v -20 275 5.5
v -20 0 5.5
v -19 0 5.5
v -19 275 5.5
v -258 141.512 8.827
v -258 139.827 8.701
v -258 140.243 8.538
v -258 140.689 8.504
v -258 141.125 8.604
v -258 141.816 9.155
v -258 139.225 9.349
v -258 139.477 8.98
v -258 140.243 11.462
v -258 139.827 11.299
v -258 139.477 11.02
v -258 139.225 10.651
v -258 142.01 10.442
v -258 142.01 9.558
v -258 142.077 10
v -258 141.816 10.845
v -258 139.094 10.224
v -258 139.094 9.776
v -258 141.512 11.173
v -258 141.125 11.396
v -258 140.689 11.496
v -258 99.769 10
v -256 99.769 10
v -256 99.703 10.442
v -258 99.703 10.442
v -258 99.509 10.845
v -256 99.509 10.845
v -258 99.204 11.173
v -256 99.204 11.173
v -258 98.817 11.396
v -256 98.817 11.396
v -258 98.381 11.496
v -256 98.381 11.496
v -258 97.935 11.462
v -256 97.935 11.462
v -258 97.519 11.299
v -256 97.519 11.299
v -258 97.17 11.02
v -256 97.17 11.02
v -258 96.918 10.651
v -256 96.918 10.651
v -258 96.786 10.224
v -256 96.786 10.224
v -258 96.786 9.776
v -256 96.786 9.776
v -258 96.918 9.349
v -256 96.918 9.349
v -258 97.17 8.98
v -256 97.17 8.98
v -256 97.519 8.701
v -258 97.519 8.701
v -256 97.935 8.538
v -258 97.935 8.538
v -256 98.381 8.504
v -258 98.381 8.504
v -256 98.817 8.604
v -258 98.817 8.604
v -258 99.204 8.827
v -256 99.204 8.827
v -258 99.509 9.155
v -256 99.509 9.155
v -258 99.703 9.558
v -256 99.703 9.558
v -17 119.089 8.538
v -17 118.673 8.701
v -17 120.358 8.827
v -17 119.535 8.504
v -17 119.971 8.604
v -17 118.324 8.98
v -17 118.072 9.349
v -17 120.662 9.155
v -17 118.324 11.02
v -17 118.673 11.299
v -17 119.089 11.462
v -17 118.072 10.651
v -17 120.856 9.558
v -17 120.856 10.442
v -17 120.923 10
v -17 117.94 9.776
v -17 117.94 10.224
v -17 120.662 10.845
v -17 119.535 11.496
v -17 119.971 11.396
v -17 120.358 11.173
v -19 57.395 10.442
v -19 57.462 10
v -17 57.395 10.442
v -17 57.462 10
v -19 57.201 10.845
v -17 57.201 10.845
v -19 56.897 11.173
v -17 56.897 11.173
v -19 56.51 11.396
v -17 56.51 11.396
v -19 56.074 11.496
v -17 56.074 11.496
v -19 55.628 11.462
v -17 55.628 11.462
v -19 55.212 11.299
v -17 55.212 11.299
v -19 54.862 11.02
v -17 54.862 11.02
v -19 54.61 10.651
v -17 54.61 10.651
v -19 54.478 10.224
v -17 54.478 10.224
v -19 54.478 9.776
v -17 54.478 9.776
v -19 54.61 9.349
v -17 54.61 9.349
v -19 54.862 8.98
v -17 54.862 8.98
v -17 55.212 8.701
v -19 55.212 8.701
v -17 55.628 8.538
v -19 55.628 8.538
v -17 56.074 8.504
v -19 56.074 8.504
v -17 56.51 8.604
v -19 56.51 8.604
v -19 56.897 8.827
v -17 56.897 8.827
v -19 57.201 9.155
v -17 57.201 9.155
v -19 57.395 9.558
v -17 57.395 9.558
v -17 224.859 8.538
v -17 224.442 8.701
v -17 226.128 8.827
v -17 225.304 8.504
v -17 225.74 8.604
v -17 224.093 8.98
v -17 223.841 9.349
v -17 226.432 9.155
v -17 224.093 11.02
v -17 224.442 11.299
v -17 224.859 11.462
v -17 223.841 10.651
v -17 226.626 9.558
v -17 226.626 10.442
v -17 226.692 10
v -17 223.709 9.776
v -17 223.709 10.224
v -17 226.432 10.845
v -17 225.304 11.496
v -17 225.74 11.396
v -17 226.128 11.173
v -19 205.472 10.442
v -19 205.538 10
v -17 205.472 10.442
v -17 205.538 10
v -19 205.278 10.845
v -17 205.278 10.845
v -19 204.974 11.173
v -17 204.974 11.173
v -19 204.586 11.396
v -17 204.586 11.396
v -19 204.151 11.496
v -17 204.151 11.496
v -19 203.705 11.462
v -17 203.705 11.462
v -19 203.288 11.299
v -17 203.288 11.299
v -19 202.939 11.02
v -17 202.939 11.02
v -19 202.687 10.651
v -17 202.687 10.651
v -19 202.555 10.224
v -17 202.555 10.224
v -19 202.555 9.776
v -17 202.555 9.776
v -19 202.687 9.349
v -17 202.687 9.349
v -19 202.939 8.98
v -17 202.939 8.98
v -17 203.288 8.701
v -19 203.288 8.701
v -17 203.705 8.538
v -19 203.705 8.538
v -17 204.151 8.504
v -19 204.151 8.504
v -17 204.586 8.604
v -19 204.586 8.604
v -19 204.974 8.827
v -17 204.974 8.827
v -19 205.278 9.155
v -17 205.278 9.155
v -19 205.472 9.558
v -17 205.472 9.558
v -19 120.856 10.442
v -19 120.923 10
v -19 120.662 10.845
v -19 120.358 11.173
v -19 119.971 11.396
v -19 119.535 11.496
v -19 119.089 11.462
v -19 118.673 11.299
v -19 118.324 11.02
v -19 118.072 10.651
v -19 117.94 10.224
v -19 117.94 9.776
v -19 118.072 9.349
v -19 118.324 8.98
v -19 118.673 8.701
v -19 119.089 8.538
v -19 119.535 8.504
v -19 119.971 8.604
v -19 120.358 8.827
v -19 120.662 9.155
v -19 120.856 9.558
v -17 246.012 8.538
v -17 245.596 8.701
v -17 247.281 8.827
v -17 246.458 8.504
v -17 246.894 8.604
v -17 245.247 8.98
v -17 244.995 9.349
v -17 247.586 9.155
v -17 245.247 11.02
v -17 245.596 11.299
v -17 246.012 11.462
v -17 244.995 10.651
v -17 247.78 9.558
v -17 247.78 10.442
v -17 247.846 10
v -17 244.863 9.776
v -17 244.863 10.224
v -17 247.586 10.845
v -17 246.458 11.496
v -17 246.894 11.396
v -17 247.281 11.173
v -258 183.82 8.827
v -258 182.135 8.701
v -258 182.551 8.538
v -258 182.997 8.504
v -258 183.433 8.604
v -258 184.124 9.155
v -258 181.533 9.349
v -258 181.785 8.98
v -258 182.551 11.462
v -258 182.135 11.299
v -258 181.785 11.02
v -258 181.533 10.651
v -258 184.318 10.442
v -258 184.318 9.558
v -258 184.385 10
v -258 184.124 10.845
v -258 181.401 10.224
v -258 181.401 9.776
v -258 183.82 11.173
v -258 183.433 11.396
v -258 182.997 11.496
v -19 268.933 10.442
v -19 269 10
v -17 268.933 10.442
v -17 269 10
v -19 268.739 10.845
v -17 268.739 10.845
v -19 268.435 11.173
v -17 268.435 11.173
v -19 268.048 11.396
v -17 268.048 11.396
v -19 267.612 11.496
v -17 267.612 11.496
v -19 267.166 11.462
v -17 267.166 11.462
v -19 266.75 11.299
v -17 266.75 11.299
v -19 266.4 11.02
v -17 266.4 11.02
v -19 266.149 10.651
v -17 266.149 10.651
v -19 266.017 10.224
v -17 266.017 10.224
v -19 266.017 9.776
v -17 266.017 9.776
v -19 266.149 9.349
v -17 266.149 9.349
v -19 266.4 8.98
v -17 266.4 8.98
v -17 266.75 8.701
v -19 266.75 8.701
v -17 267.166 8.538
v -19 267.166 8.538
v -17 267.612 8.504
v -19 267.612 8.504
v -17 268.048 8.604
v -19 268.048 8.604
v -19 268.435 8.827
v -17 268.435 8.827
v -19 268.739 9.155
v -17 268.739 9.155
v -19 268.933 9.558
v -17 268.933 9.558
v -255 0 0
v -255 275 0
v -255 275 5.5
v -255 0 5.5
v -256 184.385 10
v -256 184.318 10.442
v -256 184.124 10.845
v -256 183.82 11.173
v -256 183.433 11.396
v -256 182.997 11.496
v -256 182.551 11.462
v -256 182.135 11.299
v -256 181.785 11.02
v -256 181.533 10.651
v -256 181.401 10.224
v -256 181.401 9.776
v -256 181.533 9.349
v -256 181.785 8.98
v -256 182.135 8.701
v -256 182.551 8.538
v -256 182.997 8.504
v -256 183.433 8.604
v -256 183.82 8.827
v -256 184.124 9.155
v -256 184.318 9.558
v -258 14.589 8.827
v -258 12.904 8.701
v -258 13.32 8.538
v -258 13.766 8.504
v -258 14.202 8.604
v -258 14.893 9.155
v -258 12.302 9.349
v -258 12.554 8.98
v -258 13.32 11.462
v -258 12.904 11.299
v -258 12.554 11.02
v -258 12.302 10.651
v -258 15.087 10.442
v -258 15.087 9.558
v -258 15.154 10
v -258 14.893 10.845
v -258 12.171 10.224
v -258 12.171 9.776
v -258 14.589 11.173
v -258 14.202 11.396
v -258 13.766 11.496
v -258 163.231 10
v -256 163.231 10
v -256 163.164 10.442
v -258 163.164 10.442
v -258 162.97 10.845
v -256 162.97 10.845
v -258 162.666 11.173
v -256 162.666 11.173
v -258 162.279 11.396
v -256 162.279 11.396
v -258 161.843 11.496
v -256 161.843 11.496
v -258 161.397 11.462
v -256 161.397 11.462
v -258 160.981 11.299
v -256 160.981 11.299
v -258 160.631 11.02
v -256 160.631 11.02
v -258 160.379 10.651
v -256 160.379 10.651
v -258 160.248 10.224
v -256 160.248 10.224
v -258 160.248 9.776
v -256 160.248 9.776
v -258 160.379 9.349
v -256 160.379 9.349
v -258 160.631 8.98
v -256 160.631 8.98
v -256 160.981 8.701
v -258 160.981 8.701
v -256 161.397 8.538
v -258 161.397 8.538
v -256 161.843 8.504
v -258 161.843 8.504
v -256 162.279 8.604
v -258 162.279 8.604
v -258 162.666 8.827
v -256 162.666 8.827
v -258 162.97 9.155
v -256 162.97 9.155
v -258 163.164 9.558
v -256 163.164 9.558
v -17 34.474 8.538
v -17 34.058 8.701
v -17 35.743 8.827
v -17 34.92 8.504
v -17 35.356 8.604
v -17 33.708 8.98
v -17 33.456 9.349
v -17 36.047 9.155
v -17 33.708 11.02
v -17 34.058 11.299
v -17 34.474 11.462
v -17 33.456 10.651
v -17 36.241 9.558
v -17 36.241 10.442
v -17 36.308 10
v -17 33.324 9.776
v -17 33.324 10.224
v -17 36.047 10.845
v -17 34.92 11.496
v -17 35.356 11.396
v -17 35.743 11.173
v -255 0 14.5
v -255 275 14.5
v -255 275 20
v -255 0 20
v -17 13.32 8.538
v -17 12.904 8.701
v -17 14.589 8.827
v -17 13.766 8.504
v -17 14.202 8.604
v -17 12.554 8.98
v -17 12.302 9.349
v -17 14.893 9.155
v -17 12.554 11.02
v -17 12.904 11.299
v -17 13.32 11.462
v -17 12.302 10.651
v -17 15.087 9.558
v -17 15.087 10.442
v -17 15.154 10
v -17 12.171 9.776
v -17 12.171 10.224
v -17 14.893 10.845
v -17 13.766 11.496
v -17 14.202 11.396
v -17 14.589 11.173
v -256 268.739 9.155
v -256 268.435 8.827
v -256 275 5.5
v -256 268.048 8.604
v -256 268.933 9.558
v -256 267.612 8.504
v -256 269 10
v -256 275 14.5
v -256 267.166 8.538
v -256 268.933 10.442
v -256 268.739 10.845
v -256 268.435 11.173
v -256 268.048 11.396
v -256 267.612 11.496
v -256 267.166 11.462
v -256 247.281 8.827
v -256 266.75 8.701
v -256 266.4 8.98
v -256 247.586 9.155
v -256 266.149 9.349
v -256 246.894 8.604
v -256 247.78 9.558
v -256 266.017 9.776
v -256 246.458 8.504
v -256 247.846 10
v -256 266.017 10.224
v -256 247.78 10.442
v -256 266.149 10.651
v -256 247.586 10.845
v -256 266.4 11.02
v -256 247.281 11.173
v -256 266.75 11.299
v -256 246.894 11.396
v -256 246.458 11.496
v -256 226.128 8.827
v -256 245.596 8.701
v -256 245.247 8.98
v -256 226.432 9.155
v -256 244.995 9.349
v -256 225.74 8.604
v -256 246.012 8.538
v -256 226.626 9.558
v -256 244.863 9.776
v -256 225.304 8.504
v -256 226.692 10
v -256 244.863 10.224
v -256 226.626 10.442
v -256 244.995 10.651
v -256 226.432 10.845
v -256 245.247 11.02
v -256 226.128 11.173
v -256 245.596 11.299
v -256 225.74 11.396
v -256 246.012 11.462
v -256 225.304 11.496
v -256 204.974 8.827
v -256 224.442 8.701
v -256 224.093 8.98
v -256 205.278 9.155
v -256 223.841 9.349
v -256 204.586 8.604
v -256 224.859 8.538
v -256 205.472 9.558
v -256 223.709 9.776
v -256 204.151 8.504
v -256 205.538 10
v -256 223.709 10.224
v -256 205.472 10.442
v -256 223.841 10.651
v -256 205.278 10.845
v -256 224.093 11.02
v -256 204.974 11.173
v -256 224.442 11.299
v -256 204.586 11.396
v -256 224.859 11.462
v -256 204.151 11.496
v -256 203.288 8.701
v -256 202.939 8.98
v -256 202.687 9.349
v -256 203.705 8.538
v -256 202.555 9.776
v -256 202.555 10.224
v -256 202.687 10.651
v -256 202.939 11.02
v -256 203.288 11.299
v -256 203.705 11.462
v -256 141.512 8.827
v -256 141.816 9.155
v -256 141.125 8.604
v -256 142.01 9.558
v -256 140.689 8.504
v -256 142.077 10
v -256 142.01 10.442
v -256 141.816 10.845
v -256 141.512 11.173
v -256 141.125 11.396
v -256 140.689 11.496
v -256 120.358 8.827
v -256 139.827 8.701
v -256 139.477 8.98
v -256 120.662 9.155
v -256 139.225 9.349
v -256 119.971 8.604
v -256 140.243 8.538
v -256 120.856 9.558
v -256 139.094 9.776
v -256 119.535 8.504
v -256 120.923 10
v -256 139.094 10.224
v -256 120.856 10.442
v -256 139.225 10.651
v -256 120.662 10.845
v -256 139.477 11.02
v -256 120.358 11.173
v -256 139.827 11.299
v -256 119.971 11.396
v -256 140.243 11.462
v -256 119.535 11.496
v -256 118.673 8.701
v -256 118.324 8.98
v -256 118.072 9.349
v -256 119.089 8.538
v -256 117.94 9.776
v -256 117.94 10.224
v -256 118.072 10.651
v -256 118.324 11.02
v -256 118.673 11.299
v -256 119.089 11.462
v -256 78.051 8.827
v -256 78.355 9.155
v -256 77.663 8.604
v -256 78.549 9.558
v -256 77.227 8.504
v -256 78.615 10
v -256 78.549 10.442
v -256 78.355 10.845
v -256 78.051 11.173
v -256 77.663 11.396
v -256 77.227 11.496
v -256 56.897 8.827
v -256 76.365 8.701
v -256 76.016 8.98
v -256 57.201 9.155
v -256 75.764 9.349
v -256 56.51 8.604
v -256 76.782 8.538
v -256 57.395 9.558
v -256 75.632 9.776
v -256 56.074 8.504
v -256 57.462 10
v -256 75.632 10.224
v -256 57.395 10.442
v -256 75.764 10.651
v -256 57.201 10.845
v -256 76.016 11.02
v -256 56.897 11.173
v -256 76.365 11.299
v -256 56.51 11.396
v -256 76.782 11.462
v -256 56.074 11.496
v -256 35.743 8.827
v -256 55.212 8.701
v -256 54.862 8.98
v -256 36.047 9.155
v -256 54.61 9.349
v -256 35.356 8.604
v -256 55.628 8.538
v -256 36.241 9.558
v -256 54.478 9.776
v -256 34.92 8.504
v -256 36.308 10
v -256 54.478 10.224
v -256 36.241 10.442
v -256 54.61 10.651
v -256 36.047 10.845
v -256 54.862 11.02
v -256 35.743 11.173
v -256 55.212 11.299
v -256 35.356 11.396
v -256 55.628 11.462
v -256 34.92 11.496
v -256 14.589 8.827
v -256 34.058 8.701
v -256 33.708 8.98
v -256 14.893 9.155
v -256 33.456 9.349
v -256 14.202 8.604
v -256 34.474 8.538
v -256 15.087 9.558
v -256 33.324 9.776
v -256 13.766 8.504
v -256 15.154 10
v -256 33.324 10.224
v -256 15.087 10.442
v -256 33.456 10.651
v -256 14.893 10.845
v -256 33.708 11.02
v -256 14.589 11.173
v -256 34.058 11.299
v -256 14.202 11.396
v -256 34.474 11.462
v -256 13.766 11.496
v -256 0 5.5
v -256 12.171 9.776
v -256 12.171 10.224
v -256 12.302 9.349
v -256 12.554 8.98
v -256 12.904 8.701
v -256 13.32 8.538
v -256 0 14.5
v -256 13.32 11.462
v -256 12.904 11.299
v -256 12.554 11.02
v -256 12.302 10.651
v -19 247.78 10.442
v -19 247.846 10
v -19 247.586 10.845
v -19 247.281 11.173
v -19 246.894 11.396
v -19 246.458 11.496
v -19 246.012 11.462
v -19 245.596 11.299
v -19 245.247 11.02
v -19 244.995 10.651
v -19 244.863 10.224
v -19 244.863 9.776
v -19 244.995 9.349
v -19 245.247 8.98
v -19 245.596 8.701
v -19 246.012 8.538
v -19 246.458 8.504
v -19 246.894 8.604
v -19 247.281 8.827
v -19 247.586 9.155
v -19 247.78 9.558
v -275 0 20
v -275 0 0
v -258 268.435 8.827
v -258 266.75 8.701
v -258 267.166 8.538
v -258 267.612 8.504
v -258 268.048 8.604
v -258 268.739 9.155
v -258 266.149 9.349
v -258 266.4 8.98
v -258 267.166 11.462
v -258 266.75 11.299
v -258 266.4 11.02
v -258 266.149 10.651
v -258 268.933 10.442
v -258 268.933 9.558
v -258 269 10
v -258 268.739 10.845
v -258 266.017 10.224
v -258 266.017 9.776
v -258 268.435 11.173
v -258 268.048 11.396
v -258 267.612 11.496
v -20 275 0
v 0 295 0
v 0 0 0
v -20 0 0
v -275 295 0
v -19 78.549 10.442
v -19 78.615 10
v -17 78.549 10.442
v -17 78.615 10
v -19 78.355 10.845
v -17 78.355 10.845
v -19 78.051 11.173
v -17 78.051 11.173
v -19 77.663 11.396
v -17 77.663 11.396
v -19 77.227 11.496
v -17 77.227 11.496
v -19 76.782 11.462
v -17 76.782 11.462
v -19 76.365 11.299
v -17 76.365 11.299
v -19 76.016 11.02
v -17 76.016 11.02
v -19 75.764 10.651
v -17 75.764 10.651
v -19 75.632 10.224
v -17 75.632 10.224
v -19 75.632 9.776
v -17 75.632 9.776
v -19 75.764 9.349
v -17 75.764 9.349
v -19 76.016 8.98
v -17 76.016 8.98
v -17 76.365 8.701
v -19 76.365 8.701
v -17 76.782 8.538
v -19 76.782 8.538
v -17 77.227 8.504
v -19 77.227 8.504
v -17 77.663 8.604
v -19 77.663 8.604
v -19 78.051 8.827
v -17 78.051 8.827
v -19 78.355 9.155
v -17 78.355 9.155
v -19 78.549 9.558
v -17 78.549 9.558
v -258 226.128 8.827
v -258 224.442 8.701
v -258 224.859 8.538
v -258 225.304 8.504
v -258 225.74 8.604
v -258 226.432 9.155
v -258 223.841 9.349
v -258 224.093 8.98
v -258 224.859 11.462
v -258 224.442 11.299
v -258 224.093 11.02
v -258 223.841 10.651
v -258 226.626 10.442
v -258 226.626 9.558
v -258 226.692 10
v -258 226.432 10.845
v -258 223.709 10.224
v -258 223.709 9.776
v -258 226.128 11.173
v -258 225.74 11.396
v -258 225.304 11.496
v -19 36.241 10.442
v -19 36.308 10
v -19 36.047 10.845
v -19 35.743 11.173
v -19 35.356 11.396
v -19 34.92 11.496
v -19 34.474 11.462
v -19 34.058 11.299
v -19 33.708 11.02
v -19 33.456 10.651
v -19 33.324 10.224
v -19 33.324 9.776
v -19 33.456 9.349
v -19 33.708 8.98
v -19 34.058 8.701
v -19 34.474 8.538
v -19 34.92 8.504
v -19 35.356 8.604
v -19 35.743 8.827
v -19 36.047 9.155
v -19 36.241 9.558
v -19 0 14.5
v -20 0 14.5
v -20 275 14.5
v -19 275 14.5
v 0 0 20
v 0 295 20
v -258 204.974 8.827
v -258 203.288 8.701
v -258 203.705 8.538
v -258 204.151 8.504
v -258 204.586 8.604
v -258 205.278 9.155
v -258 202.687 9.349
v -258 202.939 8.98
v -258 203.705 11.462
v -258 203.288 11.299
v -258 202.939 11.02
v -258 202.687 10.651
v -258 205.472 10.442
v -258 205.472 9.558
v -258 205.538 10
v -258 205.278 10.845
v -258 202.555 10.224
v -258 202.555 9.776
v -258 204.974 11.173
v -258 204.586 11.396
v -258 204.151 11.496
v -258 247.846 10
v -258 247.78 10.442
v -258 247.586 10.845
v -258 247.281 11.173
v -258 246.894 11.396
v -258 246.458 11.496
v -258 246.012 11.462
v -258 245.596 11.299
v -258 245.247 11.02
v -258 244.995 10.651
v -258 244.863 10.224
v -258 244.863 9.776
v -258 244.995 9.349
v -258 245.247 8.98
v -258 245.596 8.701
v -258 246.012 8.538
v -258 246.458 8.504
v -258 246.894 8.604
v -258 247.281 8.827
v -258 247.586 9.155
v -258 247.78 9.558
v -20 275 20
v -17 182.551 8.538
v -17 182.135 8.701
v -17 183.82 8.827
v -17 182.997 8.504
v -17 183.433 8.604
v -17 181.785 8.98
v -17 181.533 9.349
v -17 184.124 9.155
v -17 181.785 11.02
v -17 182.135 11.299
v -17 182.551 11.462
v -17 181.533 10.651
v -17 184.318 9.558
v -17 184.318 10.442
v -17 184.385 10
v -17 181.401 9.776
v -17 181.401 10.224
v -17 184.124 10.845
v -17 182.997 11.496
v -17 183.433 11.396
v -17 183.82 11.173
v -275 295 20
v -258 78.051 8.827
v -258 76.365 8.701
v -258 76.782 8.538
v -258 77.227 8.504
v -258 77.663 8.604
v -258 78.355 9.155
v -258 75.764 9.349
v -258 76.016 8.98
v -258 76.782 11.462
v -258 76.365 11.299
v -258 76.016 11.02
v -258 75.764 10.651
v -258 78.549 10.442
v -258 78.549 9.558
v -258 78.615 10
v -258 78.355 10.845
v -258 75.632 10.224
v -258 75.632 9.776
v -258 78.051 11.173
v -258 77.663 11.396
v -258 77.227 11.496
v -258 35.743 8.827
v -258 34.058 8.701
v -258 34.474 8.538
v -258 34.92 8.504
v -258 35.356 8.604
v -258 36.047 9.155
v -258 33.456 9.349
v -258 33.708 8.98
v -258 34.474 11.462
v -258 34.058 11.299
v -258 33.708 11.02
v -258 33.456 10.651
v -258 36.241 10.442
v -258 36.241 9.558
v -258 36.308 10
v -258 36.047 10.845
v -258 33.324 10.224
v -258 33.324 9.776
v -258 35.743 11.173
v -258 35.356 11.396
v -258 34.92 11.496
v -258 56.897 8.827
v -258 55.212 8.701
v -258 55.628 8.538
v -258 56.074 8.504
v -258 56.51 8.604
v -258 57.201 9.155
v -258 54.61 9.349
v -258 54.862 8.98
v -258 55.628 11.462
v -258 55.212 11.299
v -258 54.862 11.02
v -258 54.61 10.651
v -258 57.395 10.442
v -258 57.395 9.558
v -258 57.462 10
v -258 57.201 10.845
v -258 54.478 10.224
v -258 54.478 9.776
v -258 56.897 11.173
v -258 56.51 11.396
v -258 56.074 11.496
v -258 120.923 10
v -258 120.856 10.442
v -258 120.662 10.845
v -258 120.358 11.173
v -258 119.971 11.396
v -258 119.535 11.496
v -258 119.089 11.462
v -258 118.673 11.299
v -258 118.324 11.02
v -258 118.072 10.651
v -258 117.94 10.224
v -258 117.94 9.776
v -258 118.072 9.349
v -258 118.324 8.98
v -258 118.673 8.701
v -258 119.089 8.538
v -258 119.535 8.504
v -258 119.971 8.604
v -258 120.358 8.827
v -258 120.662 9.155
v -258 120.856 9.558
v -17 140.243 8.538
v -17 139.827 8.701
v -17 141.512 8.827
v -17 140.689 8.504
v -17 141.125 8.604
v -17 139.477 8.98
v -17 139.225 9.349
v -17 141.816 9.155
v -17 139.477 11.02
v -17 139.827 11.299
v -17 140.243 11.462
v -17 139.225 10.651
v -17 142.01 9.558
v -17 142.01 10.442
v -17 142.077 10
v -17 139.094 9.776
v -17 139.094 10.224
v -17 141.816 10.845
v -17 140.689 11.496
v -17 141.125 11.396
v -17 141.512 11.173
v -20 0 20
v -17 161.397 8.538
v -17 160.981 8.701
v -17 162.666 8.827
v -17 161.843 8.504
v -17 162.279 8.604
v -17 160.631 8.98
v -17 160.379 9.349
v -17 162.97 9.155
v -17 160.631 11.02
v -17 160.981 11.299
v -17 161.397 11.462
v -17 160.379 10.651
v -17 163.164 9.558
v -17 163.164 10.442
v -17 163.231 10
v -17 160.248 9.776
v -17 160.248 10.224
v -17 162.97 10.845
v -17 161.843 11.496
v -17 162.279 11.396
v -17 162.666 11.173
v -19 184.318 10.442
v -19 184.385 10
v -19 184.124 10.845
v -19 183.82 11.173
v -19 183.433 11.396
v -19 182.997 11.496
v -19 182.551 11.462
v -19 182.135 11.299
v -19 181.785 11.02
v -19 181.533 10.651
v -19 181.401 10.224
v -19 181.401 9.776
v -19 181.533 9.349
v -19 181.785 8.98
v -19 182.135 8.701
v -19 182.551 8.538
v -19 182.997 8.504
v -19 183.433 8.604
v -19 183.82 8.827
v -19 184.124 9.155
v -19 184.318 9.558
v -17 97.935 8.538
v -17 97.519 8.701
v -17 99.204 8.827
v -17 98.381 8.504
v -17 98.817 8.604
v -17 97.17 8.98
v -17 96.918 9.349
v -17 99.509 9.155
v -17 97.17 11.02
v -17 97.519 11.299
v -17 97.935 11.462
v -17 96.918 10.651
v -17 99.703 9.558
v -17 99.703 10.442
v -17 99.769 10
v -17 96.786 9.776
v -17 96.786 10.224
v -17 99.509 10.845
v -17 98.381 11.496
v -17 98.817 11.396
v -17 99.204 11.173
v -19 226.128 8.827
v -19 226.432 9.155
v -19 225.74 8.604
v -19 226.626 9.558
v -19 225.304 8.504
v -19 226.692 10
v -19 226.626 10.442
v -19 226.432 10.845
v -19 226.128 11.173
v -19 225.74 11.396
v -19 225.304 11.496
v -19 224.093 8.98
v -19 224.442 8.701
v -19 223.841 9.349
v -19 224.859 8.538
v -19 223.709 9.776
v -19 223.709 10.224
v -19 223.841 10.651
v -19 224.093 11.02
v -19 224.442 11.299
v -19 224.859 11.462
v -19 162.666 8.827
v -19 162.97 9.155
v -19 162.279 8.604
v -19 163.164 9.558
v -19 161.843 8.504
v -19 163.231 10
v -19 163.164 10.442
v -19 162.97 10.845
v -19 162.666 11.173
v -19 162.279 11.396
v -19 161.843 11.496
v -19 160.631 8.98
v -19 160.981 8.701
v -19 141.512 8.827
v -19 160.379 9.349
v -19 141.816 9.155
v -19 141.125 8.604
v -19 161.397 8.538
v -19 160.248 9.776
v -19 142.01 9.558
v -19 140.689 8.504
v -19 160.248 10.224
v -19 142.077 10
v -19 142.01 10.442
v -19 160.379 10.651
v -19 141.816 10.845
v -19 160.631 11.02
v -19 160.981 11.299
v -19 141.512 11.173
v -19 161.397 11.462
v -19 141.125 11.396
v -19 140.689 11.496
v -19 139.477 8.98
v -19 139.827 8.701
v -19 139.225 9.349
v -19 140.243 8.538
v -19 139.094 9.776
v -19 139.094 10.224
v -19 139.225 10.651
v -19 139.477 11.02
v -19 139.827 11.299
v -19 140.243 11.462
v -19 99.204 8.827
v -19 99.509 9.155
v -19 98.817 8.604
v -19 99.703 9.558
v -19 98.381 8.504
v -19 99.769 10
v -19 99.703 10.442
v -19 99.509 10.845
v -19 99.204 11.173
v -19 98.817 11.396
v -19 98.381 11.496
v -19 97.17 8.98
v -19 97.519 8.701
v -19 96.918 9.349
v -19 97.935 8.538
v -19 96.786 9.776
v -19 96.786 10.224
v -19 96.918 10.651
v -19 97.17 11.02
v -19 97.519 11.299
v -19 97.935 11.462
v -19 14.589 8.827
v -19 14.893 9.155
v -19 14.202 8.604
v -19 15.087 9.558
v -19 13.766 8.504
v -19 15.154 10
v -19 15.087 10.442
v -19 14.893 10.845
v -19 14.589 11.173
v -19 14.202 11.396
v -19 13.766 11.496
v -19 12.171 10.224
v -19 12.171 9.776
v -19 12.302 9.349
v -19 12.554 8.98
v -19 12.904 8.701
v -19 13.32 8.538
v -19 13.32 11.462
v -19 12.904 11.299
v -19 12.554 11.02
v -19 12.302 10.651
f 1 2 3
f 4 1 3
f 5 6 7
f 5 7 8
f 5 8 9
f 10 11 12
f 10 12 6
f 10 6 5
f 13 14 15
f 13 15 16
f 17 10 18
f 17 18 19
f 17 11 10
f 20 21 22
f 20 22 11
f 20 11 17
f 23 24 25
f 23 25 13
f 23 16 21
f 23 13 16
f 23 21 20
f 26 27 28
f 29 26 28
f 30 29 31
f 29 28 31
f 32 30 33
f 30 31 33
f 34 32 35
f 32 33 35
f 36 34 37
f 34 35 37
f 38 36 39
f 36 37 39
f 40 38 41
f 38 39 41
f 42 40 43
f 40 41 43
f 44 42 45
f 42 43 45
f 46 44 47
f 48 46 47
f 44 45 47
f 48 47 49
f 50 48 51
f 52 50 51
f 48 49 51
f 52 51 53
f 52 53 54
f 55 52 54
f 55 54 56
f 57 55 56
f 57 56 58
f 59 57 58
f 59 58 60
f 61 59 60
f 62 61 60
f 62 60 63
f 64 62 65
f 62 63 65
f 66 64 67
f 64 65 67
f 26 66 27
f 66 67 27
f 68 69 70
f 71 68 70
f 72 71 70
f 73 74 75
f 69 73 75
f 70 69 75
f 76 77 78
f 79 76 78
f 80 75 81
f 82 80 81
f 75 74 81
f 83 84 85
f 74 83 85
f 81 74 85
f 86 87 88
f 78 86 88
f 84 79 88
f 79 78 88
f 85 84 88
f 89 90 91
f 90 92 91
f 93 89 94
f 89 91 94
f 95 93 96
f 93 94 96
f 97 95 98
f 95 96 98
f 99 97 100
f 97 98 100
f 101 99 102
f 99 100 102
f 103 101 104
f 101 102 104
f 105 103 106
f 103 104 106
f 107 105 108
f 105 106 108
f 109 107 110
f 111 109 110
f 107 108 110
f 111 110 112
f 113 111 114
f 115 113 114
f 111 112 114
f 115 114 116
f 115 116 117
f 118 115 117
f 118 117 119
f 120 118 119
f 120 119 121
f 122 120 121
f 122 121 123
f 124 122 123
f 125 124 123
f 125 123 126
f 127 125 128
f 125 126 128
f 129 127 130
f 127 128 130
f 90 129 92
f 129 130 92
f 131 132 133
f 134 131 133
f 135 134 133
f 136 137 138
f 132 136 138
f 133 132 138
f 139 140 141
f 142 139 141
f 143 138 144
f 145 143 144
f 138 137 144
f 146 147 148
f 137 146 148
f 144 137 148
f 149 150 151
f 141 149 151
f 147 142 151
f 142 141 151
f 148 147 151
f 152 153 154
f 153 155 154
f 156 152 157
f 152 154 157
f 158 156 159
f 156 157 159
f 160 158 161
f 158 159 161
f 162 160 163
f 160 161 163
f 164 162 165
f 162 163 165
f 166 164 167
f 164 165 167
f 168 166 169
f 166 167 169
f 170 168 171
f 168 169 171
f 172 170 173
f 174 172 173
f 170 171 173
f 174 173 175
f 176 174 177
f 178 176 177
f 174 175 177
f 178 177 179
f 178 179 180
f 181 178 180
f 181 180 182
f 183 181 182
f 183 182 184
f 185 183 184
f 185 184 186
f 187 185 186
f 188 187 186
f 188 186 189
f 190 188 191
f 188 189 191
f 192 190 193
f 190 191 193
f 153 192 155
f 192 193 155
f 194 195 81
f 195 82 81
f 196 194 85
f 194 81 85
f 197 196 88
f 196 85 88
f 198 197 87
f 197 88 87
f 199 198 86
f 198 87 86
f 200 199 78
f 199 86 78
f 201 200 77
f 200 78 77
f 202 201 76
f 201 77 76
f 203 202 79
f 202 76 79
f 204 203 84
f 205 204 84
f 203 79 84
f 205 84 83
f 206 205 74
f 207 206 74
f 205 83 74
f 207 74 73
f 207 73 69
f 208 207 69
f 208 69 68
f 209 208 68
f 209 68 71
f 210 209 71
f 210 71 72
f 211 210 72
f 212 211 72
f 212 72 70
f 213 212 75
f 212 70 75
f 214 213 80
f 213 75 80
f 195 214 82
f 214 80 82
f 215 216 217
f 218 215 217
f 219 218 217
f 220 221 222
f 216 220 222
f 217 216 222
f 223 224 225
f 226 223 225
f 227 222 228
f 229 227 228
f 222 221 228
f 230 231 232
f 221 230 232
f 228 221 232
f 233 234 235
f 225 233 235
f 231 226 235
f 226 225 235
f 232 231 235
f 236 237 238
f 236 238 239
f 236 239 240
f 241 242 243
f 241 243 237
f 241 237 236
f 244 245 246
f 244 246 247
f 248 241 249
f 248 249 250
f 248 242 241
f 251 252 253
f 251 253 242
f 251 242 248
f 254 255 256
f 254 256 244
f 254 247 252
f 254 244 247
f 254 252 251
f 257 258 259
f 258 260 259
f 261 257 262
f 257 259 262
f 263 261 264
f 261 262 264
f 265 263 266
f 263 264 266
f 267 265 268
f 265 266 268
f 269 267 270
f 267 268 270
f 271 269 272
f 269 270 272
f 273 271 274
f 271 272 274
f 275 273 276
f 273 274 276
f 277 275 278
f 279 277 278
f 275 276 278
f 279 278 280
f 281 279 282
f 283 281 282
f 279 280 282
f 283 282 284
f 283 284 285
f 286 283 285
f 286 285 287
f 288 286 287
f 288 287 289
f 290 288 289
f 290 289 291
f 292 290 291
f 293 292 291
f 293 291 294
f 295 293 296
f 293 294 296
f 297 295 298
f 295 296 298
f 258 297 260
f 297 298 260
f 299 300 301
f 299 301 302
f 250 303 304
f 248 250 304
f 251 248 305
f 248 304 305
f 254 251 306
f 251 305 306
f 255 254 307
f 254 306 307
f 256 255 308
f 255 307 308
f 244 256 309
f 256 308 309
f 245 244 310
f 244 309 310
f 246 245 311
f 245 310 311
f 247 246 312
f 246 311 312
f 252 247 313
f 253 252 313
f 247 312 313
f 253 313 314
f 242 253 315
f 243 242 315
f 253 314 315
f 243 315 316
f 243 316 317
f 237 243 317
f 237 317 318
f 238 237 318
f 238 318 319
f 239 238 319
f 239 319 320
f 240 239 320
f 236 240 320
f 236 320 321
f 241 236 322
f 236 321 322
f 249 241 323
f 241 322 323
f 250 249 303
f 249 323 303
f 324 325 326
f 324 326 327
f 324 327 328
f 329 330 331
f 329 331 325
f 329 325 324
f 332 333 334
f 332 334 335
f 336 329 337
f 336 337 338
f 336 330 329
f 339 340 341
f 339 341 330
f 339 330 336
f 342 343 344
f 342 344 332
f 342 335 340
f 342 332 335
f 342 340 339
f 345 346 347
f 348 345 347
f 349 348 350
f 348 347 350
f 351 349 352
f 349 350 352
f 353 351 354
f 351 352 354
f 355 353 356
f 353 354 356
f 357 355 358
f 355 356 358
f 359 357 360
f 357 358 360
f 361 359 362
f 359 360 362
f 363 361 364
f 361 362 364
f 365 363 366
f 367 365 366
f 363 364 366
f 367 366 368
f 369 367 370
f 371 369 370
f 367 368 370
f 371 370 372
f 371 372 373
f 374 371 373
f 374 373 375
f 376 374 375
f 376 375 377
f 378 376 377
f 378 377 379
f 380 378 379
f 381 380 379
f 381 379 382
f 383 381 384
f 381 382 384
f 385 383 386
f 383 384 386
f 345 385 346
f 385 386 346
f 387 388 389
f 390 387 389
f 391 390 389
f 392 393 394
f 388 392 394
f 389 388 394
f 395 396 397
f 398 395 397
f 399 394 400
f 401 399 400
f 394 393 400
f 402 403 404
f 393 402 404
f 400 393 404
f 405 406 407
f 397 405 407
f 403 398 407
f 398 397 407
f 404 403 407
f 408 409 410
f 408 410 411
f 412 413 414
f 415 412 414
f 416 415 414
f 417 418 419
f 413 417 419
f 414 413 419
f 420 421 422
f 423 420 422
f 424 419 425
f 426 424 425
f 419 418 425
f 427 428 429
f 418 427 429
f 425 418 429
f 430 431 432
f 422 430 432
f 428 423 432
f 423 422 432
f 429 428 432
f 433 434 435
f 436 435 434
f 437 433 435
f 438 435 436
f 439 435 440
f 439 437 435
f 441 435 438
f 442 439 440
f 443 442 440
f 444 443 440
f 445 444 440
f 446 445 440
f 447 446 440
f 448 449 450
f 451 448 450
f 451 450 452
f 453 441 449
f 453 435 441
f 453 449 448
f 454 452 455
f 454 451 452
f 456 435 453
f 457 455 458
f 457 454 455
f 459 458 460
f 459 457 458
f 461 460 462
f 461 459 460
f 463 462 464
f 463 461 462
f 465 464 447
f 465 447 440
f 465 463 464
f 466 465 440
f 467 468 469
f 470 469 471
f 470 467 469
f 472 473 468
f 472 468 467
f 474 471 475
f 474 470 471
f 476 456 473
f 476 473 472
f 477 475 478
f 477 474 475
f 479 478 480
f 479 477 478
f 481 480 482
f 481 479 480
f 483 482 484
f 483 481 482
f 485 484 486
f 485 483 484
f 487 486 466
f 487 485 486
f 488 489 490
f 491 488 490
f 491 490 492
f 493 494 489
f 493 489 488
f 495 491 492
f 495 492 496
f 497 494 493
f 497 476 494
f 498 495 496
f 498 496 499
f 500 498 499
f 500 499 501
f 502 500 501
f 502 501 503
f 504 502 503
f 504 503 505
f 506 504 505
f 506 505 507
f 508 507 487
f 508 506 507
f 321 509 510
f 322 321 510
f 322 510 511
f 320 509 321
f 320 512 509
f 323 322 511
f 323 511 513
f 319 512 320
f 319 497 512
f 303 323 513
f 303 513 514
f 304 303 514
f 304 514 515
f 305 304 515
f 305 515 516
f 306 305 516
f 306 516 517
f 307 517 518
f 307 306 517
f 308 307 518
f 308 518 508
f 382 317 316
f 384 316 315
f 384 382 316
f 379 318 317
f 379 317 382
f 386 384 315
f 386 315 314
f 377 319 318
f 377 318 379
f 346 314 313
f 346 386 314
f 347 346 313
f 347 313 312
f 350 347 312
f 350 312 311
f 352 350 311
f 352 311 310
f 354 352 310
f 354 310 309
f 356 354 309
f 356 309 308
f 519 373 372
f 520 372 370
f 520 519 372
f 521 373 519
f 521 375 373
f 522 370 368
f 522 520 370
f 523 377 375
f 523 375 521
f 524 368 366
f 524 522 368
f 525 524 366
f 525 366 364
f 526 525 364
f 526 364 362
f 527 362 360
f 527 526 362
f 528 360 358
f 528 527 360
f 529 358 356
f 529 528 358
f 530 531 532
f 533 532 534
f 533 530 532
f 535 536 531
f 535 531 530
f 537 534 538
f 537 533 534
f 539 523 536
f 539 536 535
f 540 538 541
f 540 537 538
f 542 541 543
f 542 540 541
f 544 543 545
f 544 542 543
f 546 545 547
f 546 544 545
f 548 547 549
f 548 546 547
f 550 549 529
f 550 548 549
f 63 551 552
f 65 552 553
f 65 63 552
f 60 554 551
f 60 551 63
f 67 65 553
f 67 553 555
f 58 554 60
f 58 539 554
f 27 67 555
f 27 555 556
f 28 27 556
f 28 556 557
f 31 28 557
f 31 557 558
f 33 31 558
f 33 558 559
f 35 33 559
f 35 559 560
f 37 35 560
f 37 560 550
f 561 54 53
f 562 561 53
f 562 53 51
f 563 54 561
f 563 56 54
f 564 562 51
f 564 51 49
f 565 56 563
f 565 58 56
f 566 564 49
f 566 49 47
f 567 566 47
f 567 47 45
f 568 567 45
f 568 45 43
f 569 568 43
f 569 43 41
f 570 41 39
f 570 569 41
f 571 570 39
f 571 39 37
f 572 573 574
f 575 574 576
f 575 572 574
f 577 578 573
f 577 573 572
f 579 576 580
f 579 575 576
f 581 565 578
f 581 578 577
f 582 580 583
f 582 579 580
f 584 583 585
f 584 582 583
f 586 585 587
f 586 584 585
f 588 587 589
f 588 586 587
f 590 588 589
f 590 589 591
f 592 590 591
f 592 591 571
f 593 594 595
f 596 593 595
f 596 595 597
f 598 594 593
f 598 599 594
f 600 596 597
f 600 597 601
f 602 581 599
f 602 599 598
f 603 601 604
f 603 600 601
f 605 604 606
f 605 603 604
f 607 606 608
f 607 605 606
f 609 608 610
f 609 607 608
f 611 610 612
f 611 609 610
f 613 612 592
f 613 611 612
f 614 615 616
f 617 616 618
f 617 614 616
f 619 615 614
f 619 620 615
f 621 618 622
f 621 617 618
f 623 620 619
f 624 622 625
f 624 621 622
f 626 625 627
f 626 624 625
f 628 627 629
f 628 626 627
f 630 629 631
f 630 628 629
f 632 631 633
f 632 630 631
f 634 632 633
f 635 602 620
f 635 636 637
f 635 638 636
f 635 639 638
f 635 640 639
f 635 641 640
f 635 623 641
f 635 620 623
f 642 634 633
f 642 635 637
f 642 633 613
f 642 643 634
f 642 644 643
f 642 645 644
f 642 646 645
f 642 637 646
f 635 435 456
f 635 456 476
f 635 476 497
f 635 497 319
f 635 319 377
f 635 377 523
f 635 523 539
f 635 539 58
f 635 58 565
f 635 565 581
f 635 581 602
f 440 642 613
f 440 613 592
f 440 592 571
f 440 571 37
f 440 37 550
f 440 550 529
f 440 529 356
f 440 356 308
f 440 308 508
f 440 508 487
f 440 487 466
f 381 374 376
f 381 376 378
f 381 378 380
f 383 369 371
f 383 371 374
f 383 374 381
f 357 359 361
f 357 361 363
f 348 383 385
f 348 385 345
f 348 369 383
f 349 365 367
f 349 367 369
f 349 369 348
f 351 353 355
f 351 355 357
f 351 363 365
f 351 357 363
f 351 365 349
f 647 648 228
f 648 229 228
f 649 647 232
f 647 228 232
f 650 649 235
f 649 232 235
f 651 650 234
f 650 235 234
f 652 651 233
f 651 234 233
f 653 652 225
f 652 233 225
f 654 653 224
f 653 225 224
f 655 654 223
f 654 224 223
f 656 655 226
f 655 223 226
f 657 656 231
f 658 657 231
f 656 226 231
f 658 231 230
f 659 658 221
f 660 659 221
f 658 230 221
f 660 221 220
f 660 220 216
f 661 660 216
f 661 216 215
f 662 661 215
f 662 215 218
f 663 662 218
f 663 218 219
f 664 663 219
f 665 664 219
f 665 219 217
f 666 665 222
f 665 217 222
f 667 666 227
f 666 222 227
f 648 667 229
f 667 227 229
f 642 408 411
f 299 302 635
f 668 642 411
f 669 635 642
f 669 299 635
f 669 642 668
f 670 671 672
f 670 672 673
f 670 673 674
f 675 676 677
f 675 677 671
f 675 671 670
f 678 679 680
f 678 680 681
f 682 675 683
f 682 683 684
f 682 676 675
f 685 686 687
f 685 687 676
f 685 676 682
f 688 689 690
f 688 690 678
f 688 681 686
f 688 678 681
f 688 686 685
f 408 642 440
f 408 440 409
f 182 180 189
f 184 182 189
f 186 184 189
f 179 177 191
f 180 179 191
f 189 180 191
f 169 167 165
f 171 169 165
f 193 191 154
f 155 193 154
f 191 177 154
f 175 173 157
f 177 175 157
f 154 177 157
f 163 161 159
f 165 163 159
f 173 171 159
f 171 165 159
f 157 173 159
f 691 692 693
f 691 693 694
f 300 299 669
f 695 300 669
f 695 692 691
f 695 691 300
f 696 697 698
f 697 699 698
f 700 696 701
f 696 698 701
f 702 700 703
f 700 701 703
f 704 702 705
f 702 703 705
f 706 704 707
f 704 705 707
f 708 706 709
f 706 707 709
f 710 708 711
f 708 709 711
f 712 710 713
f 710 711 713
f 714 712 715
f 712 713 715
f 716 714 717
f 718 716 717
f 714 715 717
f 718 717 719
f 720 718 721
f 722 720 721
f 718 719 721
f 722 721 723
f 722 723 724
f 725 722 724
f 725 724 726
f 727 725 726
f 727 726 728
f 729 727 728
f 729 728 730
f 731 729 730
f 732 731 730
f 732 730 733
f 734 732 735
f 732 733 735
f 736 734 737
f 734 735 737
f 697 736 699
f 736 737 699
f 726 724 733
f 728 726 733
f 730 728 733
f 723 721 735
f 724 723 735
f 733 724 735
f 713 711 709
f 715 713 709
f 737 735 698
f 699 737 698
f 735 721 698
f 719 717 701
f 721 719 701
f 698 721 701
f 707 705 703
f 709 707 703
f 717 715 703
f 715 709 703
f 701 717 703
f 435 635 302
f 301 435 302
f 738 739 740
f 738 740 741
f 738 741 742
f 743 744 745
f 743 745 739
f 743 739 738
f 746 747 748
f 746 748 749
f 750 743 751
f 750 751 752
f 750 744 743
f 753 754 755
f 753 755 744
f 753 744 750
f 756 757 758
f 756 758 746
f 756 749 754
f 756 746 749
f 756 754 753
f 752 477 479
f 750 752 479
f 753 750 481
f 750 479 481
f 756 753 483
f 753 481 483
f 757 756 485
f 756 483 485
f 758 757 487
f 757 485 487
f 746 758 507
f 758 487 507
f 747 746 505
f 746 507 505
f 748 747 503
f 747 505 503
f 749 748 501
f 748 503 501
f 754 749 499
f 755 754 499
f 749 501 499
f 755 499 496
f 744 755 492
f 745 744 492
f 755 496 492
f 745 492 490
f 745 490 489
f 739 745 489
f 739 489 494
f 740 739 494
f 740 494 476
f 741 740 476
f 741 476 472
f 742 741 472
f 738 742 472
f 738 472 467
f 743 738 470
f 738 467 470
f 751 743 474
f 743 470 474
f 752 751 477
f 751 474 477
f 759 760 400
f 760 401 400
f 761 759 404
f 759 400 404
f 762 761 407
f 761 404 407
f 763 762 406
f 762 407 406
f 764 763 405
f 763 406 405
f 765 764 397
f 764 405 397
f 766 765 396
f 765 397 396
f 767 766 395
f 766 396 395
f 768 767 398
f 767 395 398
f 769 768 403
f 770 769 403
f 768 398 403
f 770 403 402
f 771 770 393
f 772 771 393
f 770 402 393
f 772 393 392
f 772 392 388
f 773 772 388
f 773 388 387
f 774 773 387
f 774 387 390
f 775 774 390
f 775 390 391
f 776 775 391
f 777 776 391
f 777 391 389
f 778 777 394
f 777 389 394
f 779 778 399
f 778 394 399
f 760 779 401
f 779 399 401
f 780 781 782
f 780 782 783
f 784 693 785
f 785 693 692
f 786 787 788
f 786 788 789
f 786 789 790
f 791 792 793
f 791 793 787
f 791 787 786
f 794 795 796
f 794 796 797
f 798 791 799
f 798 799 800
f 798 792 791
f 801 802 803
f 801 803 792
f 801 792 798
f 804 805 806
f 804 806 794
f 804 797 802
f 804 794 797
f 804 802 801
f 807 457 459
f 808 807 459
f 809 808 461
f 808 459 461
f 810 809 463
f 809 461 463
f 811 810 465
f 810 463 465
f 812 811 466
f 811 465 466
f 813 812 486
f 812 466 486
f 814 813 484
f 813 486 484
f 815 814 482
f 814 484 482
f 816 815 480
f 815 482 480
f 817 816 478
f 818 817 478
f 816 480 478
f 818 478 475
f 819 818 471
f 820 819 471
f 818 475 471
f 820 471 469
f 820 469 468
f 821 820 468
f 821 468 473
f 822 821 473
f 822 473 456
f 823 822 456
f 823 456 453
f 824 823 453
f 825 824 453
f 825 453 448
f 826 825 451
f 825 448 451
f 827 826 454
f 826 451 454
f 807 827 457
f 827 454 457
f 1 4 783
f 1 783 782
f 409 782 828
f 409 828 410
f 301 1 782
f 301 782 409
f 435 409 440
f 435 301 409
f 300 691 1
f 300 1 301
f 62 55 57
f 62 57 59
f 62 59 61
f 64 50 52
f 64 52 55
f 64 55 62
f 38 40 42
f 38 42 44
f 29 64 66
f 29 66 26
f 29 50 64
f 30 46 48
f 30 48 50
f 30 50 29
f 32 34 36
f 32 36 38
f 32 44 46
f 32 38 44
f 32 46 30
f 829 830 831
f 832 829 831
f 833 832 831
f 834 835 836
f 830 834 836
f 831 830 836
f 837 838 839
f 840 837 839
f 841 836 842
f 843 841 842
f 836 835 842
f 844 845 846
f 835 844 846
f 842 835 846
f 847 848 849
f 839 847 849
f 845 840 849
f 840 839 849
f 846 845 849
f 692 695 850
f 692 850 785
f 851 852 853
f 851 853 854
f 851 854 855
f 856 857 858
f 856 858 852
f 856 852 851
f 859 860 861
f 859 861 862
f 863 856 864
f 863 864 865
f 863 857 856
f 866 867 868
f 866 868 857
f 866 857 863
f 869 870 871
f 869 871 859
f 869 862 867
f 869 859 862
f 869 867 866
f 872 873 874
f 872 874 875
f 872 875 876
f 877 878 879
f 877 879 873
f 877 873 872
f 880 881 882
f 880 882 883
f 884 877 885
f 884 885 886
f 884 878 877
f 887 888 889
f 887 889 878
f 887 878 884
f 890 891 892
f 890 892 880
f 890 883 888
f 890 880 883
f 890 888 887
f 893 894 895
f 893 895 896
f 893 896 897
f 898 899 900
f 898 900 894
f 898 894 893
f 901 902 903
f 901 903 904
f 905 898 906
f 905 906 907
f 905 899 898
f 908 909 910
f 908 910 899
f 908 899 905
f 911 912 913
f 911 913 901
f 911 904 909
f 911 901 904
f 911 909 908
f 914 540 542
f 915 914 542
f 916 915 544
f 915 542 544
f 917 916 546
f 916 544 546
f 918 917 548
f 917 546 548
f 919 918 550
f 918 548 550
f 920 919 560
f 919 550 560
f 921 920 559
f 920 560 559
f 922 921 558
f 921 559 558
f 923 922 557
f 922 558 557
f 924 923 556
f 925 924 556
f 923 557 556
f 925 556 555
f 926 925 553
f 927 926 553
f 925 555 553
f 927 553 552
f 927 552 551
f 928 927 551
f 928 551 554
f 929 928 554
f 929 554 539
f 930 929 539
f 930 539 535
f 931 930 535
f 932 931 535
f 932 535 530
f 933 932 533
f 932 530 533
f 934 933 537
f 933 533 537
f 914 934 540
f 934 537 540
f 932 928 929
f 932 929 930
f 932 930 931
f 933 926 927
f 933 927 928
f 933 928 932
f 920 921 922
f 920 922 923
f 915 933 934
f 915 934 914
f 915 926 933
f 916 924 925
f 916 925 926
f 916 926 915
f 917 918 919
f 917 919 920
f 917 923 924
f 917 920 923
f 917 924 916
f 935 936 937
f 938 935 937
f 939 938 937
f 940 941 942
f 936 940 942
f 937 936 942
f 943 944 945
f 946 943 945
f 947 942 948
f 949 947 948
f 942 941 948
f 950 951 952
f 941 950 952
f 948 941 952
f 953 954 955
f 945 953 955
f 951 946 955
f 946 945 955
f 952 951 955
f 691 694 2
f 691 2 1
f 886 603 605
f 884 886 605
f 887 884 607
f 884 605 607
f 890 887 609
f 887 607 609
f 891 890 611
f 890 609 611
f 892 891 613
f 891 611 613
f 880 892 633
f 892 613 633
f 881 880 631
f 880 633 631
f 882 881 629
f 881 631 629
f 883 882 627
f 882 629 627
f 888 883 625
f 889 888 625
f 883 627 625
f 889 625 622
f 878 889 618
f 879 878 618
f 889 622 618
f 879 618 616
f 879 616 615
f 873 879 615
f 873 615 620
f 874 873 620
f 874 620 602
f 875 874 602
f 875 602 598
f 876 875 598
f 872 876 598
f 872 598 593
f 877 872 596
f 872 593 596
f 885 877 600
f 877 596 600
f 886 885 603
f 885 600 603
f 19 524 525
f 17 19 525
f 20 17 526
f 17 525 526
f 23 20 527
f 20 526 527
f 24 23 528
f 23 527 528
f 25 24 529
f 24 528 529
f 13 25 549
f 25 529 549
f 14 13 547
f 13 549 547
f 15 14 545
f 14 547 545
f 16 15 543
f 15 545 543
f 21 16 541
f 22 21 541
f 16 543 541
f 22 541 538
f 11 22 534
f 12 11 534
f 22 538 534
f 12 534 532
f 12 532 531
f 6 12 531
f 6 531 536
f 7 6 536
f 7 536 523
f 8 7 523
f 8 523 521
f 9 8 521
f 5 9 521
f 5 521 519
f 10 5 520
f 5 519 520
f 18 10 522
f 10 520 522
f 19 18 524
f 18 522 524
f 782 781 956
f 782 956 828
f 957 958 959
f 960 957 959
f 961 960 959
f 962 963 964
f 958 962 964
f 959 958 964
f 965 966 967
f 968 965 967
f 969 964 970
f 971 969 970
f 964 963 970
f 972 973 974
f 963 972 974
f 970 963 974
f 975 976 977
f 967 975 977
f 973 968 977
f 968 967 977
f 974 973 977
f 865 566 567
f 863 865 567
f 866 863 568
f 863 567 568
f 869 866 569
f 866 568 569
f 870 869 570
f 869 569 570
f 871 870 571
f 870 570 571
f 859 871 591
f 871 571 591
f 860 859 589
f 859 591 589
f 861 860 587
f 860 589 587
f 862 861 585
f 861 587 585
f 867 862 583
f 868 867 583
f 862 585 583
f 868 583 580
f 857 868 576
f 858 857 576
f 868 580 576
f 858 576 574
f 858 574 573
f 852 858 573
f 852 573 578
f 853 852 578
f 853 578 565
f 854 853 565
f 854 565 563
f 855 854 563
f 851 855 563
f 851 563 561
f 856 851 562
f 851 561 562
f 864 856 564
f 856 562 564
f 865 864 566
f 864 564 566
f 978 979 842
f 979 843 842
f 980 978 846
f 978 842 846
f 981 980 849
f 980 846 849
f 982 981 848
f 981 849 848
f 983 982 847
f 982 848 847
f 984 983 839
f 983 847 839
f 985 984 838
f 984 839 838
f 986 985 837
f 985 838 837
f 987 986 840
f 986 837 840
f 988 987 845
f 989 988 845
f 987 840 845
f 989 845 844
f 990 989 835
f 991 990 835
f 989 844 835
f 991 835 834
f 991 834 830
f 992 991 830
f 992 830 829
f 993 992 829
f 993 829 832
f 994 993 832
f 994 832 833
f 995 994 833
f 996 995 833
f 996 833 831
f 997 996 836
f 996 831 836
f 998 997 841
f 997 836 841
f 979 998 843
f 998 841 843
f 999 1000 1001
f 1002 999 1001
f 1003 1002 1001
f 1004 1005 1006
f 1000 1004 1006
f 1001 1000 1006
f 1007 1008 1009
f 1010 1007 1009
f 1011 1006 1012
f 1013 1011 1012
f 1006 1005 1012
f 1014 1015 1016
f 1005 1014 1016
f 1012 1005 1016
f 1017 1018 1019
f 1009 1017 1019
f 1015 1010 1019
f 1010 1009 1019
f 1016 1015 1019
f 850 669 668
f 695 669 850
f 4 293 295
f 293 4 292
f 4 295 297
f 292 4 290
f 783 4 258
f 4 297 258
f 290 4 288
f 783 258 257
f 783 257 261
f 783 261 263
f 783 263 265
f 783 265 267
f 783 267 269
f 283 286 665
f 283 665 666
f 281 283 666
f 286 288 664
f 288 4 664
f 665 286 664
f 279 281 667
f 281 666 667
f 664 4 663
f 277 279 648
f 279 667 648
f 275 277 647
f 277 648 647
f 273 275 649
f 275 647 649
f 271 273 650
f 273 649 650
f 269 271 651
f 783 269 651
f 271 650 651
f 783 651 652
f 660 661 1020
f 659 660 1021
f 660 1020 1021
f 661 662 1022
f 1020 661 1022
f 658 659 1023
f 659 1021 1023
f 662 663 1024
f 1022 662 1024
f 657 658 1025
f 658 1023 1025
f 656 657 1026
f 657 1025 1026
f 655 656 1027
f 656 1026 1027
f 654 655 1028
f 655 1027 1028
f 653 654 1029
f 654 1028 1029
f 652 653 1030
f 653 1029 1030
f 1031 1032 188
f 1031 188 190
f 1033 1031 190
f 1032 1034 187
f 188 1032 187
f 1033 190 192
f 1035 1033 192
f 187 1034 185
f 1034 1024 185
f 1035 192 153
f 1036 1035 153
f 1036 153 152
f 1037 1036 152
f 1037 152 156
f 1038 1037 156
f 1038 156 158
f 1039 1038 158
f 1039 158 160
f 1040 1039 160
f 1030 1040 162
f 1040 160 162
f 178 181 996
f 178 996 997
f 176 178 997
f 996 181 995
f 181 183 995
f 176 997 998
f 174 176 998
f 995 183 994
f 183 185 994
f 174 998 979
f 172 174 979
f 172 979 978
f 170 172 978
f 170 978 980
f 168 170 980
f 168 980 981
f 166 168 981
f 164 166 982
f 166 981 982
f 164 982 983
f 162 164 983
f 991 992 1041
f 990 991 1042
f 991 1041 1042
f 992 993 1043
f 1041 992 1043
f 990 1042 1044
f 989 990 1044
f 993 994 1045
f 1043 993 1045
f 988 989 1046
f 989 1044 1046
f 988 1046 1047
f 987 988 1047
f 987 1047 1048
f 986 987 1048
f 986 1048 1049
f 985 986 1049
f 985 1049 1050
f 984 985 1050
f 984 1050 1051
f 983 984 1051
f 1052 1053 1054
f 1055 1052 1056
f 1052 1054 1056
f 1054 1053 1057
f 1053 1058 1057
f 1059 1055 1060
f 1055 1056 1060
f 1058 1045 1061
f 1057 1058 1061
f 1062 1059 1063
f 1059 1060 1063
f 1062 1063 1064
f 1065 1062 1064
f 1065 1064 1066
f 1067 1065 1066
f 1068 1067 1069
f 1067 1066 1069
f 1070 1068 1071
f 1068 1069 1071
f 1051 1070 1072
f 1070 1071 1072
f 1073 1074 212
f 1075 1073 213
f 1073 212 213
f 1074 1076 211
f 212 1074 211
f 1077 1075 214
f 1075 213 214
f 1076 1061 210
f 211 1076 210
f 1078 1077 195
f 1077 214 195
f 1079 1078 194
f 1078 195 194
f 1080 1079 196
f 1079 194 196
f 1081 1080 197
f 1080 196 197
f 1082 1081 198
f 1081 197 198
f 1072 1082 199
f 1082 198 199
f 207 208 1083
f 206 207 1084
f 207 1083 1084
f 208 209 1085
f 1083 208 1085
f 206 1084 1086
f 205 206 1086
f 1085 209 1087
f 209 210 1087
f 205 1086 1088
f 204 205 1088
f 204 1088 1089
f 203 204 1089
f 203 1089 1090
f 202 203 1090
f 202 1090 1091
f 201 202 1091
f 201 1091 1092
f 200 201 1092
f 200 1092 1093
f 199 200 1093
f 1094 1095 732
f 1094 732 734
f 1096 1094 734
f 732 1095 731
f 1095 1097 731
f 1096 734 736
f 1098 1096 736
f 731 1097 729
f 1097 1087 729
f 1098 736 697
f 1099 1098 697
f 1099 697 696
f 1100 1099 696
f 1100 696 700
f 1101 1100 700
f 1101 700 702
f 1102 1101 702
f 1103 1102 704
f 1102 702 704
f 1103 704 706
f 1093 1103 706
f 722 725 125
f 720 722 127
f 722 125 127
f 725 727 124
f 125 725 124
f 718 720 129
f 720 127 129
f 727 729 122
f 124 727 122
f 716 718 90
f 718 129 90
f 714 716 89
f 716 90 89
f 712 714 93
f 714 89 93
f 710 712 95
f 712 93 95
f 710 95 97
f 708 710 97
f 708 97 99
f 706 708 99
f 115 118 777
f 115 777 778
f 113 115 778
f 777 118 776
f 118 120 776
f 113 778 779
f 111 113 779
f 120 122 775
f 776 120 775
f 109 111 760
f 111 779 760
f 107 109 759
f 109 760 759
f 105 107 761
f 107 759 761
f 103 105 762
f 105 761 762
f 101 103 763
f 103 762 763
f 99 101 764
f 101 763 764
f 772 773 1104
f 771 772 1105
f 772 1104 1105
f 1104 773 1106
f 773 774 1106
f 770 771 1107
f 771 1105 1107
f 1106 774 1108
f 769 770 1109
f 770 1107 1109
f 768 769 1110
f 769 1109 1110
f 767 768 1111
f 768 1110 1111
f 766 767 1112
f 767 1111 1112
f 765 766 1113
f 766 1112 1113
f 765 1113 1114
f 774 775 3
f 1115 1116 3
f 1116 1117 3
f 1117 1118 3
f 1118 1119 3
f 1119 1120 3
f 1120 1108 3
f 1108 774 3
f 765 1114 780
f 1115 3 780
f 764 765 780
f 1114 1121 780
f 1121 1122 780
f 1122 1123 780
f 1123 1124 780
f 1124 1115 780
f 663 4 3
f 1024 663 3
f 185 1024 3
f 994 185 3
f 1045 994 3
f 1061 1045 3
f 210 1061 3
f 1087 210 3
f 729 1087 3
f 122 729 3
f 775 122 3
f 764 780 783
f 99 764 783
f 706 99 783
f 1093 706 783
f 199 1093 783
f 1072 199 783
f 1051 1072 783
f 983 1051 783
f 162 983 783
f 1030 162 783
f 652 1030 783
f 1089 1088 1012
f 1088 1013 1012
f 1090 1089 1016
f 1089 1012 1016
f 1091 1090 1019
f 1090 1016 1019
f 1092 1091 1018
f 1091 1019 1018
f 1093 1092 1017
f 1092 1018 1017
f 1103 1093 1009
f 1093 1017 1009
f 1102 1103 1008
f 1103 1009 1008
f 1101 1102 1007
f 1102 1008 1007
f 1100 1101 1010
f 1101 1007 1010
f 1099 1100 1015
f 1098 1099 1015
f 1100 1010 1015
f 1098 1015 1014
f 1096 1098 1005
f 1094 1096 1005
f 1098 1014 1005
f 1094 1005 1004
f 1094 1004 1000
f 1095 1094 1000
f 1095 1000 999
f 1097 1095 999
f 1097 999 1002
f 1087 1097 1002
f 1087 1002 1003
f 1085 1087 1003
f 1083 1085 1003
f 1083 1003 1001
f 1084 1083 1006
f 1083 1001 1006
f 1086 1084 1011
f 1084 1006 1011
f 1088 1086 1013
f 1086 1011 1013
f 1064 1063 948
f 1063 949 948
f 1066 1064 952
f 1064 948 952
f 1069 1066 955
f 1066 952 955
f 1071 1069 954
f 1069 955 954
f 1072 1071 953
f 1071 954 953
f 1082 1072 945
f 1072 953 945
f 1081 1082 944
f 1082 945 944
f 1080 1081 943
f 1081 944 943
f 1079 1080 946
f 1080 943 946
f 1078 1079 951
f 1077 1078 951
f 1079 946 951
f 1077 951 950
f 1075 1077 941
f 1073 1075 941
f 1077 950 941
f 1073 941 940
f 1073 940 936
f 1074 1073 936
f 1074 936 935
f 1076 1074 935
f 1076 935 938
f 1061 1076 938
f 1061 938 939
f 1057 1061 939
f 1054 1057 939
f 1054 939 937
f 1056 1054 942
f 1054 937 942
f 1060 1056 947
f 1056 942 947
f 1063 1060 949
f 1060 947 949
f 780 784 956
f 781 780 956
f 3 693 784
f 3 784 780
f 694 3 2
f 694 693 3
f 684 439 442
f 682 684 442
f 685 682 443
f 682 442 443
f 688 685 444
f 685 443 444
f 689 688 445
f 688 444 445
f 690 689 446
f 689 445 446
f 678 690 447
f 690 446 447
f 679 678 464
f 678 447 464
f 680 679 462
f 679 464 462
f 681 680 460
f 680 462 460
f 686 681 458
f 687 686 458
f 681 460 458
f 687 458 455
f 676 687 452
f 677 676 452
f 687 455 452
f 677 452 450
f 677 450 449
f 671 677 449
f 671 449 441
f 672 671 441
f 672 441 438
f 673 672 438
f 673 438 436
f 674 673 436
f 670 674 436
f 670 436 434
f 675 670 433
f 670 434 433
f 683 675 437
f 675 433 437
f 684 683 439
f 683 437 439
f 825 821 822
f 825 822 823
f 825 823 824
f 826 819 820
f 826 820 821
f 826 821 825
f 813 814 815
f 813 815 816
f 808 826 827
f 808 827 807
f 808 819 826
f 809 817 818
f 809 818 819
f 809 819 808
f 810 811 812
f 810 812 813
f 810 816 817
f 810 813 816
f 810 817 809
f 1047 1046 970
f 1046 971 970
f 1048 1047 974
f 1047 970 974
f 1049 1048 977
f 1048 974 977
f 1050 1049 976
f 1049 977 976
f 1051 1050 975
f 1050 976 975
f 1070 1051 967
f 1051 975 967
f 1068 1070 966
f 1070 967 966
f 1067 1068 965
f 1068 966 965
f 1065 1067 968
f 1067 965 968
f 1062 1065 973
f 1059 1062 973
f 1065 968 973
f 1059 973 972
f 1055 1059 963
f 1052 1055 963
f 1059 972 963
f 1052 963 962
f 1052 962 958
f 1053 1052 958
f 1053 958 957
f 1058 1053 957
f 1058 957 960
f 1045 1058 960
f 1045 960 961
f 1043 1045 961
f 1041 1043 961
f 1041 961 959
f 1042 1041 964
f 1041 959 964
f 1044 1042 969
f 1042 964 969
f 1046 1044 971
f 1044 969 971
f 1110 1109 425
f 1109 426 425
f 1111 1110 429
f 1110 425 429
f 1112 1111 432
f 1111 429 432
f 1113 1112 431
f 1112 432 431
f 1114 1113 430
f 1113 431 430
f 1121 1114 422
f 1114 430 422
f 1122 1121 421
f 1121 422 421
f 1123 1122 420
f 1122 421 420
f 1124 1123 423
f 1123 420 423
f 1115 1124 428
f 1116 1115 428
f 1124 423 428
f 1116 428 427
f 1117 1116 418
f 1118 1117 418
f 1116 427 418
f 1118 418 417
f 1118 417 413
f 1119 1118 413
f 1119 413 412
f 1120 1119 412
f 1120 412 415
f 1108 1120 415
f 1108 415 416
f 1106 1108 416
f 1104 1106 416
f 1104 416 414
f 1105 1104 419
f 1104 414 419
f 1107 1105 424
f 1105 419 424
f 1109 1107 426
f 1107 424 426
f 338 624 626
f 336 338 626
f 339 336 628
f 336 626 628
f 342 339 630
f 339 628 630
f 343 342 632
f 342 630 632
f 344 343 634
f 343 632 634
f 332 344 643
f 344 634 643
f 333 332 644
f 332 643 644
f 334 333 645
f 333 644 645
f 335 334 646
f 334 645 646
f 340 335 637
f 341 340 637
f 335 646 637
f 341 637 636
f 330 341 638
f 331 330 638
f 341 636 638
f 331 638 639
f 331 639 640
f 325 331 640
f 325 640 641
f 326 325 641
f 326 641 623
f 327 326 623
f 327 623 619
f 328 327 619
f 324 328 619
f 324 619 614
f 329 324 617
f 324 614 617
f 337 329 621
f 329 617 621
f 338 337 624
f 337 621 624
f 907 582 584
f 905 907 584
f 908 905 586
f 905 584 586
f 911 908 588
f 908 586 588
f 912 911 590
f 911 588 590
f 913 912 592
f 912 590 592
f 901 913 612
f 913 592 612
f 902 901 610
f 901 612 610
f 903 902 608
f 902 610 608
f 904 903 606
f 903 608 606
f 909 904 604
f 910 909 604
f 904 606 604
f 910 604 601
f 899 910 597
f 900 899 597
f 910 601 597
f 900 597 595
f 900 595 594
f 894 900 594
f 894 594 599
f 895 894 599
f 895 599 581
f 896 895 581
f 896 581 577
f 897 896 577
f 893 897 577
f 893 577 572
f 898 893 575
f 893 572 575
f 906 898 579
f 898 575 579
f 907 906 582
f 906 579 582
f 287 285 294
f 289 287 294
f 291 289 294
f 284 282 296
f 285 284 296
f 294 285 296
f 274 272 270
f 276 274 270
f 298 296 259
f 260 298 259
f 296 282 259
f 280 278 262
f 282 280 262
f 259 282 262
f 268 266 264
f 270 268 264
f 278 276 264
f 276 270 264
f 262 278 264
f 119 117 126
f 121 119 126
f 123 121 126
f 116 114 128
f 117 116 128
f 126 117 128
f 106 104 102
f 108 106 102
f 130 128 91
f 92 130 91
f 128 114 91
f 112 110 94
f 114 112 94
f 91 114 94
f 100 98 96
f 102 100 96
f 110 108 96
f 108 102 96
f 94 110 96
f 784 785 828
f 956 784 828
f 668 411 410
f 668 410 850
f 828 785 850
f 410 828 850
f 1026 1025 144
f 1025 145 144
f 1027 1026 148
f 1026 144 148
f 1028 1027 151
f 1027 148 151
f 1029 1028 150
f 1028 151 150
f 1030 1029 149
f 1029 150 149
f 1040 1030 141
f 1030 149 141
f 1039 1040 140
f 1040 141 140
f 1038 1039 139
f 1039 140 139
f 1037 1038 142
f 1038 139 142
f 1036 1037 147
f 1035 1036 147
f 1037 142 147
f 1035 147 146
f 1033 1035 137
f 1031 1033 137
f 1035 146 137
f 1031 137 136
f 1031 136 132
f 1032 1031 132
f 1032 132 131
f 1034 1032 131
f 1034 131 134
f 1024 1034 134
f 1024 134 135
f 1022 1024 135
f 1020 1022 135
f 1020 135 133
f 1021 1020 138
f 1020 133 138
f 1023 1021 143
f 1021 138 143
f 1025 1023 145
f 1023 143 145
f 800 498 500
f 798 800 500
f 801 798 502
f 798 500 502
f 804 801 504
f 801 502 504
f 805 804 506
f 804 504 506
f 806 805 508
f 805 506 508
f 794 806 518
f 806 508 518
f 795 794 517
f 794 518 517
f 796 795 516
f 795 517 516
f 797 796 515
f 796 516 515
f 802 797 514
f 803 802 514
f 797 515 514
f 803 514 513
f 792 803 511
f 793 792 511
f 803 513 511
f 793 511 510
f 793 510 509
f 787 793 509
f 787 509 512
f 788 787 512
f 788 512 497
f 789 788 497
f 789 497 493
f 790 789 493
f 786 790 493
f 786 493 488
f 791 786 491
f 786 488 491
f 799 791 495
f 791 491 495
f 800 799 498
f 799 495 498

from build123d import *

# Parameters (mm, degrees)
PAD007_DEPTH           = 20
SKETCH020_W            = 1
SKETCH020_H            = 9
POCKET012_DEPTH        = 275
SKETCH033_R            = 1.5
POCKET021_DEPTH        = 120.5
LINEARPATTERN005_COUNT = 14
LINEARPATTERN005_PITCH = 21.153846


with BuildPart() as part:
    # Sketch019 → Pad007 (new body)
    with BuildSketch(Plane.XY):
        Polygon((0, 275), (0, 0), (-20, 0), (-20, 275), (-255, 275), (-255, 0), (-275, 0), (-275, 295), (0, 295), align=None)
    extrude(amount=PAD007_DEPTH)

    # Sketch020 → Pocket012 (cut)
    with BuildSketch(Plane.XZ):
        with Locations((-19.5, 10)):
            Rectangle(SKETCH020_W, SKETCH020_H)
        with Locations((-255.5, 10)):
            Rectangle(SKETCH020_W, SKETCH020_H)
    extrude(amount=-POCKET012_DEPTH, mode=Mode.SUBTRACT)

    # Sketch033 → Pocket021 (cut, symmetric)
    with BuildSketch(Plane(origin=(-137.5, 1, 0), x_dir=(0, 1, 0), z_dir=(1, 0, 0))):
        with Locations((266.5, 10)):
            Circle(SKETCH033_R)
    pocket021 = extrude(amount=POCKET021_DEPTH, both=True, mode=Mode.SUBTRACT)

    # LinearPattern005: Pocket021 ×14
    with Locations(*[(0, -i * LINEARPATTERN005_PITCH, 0) for i in range(1, LINEARPATTERN005_COUNT)]):
        add(pocket021, mode=Mode.SUBTRACT)


solid = part.part
